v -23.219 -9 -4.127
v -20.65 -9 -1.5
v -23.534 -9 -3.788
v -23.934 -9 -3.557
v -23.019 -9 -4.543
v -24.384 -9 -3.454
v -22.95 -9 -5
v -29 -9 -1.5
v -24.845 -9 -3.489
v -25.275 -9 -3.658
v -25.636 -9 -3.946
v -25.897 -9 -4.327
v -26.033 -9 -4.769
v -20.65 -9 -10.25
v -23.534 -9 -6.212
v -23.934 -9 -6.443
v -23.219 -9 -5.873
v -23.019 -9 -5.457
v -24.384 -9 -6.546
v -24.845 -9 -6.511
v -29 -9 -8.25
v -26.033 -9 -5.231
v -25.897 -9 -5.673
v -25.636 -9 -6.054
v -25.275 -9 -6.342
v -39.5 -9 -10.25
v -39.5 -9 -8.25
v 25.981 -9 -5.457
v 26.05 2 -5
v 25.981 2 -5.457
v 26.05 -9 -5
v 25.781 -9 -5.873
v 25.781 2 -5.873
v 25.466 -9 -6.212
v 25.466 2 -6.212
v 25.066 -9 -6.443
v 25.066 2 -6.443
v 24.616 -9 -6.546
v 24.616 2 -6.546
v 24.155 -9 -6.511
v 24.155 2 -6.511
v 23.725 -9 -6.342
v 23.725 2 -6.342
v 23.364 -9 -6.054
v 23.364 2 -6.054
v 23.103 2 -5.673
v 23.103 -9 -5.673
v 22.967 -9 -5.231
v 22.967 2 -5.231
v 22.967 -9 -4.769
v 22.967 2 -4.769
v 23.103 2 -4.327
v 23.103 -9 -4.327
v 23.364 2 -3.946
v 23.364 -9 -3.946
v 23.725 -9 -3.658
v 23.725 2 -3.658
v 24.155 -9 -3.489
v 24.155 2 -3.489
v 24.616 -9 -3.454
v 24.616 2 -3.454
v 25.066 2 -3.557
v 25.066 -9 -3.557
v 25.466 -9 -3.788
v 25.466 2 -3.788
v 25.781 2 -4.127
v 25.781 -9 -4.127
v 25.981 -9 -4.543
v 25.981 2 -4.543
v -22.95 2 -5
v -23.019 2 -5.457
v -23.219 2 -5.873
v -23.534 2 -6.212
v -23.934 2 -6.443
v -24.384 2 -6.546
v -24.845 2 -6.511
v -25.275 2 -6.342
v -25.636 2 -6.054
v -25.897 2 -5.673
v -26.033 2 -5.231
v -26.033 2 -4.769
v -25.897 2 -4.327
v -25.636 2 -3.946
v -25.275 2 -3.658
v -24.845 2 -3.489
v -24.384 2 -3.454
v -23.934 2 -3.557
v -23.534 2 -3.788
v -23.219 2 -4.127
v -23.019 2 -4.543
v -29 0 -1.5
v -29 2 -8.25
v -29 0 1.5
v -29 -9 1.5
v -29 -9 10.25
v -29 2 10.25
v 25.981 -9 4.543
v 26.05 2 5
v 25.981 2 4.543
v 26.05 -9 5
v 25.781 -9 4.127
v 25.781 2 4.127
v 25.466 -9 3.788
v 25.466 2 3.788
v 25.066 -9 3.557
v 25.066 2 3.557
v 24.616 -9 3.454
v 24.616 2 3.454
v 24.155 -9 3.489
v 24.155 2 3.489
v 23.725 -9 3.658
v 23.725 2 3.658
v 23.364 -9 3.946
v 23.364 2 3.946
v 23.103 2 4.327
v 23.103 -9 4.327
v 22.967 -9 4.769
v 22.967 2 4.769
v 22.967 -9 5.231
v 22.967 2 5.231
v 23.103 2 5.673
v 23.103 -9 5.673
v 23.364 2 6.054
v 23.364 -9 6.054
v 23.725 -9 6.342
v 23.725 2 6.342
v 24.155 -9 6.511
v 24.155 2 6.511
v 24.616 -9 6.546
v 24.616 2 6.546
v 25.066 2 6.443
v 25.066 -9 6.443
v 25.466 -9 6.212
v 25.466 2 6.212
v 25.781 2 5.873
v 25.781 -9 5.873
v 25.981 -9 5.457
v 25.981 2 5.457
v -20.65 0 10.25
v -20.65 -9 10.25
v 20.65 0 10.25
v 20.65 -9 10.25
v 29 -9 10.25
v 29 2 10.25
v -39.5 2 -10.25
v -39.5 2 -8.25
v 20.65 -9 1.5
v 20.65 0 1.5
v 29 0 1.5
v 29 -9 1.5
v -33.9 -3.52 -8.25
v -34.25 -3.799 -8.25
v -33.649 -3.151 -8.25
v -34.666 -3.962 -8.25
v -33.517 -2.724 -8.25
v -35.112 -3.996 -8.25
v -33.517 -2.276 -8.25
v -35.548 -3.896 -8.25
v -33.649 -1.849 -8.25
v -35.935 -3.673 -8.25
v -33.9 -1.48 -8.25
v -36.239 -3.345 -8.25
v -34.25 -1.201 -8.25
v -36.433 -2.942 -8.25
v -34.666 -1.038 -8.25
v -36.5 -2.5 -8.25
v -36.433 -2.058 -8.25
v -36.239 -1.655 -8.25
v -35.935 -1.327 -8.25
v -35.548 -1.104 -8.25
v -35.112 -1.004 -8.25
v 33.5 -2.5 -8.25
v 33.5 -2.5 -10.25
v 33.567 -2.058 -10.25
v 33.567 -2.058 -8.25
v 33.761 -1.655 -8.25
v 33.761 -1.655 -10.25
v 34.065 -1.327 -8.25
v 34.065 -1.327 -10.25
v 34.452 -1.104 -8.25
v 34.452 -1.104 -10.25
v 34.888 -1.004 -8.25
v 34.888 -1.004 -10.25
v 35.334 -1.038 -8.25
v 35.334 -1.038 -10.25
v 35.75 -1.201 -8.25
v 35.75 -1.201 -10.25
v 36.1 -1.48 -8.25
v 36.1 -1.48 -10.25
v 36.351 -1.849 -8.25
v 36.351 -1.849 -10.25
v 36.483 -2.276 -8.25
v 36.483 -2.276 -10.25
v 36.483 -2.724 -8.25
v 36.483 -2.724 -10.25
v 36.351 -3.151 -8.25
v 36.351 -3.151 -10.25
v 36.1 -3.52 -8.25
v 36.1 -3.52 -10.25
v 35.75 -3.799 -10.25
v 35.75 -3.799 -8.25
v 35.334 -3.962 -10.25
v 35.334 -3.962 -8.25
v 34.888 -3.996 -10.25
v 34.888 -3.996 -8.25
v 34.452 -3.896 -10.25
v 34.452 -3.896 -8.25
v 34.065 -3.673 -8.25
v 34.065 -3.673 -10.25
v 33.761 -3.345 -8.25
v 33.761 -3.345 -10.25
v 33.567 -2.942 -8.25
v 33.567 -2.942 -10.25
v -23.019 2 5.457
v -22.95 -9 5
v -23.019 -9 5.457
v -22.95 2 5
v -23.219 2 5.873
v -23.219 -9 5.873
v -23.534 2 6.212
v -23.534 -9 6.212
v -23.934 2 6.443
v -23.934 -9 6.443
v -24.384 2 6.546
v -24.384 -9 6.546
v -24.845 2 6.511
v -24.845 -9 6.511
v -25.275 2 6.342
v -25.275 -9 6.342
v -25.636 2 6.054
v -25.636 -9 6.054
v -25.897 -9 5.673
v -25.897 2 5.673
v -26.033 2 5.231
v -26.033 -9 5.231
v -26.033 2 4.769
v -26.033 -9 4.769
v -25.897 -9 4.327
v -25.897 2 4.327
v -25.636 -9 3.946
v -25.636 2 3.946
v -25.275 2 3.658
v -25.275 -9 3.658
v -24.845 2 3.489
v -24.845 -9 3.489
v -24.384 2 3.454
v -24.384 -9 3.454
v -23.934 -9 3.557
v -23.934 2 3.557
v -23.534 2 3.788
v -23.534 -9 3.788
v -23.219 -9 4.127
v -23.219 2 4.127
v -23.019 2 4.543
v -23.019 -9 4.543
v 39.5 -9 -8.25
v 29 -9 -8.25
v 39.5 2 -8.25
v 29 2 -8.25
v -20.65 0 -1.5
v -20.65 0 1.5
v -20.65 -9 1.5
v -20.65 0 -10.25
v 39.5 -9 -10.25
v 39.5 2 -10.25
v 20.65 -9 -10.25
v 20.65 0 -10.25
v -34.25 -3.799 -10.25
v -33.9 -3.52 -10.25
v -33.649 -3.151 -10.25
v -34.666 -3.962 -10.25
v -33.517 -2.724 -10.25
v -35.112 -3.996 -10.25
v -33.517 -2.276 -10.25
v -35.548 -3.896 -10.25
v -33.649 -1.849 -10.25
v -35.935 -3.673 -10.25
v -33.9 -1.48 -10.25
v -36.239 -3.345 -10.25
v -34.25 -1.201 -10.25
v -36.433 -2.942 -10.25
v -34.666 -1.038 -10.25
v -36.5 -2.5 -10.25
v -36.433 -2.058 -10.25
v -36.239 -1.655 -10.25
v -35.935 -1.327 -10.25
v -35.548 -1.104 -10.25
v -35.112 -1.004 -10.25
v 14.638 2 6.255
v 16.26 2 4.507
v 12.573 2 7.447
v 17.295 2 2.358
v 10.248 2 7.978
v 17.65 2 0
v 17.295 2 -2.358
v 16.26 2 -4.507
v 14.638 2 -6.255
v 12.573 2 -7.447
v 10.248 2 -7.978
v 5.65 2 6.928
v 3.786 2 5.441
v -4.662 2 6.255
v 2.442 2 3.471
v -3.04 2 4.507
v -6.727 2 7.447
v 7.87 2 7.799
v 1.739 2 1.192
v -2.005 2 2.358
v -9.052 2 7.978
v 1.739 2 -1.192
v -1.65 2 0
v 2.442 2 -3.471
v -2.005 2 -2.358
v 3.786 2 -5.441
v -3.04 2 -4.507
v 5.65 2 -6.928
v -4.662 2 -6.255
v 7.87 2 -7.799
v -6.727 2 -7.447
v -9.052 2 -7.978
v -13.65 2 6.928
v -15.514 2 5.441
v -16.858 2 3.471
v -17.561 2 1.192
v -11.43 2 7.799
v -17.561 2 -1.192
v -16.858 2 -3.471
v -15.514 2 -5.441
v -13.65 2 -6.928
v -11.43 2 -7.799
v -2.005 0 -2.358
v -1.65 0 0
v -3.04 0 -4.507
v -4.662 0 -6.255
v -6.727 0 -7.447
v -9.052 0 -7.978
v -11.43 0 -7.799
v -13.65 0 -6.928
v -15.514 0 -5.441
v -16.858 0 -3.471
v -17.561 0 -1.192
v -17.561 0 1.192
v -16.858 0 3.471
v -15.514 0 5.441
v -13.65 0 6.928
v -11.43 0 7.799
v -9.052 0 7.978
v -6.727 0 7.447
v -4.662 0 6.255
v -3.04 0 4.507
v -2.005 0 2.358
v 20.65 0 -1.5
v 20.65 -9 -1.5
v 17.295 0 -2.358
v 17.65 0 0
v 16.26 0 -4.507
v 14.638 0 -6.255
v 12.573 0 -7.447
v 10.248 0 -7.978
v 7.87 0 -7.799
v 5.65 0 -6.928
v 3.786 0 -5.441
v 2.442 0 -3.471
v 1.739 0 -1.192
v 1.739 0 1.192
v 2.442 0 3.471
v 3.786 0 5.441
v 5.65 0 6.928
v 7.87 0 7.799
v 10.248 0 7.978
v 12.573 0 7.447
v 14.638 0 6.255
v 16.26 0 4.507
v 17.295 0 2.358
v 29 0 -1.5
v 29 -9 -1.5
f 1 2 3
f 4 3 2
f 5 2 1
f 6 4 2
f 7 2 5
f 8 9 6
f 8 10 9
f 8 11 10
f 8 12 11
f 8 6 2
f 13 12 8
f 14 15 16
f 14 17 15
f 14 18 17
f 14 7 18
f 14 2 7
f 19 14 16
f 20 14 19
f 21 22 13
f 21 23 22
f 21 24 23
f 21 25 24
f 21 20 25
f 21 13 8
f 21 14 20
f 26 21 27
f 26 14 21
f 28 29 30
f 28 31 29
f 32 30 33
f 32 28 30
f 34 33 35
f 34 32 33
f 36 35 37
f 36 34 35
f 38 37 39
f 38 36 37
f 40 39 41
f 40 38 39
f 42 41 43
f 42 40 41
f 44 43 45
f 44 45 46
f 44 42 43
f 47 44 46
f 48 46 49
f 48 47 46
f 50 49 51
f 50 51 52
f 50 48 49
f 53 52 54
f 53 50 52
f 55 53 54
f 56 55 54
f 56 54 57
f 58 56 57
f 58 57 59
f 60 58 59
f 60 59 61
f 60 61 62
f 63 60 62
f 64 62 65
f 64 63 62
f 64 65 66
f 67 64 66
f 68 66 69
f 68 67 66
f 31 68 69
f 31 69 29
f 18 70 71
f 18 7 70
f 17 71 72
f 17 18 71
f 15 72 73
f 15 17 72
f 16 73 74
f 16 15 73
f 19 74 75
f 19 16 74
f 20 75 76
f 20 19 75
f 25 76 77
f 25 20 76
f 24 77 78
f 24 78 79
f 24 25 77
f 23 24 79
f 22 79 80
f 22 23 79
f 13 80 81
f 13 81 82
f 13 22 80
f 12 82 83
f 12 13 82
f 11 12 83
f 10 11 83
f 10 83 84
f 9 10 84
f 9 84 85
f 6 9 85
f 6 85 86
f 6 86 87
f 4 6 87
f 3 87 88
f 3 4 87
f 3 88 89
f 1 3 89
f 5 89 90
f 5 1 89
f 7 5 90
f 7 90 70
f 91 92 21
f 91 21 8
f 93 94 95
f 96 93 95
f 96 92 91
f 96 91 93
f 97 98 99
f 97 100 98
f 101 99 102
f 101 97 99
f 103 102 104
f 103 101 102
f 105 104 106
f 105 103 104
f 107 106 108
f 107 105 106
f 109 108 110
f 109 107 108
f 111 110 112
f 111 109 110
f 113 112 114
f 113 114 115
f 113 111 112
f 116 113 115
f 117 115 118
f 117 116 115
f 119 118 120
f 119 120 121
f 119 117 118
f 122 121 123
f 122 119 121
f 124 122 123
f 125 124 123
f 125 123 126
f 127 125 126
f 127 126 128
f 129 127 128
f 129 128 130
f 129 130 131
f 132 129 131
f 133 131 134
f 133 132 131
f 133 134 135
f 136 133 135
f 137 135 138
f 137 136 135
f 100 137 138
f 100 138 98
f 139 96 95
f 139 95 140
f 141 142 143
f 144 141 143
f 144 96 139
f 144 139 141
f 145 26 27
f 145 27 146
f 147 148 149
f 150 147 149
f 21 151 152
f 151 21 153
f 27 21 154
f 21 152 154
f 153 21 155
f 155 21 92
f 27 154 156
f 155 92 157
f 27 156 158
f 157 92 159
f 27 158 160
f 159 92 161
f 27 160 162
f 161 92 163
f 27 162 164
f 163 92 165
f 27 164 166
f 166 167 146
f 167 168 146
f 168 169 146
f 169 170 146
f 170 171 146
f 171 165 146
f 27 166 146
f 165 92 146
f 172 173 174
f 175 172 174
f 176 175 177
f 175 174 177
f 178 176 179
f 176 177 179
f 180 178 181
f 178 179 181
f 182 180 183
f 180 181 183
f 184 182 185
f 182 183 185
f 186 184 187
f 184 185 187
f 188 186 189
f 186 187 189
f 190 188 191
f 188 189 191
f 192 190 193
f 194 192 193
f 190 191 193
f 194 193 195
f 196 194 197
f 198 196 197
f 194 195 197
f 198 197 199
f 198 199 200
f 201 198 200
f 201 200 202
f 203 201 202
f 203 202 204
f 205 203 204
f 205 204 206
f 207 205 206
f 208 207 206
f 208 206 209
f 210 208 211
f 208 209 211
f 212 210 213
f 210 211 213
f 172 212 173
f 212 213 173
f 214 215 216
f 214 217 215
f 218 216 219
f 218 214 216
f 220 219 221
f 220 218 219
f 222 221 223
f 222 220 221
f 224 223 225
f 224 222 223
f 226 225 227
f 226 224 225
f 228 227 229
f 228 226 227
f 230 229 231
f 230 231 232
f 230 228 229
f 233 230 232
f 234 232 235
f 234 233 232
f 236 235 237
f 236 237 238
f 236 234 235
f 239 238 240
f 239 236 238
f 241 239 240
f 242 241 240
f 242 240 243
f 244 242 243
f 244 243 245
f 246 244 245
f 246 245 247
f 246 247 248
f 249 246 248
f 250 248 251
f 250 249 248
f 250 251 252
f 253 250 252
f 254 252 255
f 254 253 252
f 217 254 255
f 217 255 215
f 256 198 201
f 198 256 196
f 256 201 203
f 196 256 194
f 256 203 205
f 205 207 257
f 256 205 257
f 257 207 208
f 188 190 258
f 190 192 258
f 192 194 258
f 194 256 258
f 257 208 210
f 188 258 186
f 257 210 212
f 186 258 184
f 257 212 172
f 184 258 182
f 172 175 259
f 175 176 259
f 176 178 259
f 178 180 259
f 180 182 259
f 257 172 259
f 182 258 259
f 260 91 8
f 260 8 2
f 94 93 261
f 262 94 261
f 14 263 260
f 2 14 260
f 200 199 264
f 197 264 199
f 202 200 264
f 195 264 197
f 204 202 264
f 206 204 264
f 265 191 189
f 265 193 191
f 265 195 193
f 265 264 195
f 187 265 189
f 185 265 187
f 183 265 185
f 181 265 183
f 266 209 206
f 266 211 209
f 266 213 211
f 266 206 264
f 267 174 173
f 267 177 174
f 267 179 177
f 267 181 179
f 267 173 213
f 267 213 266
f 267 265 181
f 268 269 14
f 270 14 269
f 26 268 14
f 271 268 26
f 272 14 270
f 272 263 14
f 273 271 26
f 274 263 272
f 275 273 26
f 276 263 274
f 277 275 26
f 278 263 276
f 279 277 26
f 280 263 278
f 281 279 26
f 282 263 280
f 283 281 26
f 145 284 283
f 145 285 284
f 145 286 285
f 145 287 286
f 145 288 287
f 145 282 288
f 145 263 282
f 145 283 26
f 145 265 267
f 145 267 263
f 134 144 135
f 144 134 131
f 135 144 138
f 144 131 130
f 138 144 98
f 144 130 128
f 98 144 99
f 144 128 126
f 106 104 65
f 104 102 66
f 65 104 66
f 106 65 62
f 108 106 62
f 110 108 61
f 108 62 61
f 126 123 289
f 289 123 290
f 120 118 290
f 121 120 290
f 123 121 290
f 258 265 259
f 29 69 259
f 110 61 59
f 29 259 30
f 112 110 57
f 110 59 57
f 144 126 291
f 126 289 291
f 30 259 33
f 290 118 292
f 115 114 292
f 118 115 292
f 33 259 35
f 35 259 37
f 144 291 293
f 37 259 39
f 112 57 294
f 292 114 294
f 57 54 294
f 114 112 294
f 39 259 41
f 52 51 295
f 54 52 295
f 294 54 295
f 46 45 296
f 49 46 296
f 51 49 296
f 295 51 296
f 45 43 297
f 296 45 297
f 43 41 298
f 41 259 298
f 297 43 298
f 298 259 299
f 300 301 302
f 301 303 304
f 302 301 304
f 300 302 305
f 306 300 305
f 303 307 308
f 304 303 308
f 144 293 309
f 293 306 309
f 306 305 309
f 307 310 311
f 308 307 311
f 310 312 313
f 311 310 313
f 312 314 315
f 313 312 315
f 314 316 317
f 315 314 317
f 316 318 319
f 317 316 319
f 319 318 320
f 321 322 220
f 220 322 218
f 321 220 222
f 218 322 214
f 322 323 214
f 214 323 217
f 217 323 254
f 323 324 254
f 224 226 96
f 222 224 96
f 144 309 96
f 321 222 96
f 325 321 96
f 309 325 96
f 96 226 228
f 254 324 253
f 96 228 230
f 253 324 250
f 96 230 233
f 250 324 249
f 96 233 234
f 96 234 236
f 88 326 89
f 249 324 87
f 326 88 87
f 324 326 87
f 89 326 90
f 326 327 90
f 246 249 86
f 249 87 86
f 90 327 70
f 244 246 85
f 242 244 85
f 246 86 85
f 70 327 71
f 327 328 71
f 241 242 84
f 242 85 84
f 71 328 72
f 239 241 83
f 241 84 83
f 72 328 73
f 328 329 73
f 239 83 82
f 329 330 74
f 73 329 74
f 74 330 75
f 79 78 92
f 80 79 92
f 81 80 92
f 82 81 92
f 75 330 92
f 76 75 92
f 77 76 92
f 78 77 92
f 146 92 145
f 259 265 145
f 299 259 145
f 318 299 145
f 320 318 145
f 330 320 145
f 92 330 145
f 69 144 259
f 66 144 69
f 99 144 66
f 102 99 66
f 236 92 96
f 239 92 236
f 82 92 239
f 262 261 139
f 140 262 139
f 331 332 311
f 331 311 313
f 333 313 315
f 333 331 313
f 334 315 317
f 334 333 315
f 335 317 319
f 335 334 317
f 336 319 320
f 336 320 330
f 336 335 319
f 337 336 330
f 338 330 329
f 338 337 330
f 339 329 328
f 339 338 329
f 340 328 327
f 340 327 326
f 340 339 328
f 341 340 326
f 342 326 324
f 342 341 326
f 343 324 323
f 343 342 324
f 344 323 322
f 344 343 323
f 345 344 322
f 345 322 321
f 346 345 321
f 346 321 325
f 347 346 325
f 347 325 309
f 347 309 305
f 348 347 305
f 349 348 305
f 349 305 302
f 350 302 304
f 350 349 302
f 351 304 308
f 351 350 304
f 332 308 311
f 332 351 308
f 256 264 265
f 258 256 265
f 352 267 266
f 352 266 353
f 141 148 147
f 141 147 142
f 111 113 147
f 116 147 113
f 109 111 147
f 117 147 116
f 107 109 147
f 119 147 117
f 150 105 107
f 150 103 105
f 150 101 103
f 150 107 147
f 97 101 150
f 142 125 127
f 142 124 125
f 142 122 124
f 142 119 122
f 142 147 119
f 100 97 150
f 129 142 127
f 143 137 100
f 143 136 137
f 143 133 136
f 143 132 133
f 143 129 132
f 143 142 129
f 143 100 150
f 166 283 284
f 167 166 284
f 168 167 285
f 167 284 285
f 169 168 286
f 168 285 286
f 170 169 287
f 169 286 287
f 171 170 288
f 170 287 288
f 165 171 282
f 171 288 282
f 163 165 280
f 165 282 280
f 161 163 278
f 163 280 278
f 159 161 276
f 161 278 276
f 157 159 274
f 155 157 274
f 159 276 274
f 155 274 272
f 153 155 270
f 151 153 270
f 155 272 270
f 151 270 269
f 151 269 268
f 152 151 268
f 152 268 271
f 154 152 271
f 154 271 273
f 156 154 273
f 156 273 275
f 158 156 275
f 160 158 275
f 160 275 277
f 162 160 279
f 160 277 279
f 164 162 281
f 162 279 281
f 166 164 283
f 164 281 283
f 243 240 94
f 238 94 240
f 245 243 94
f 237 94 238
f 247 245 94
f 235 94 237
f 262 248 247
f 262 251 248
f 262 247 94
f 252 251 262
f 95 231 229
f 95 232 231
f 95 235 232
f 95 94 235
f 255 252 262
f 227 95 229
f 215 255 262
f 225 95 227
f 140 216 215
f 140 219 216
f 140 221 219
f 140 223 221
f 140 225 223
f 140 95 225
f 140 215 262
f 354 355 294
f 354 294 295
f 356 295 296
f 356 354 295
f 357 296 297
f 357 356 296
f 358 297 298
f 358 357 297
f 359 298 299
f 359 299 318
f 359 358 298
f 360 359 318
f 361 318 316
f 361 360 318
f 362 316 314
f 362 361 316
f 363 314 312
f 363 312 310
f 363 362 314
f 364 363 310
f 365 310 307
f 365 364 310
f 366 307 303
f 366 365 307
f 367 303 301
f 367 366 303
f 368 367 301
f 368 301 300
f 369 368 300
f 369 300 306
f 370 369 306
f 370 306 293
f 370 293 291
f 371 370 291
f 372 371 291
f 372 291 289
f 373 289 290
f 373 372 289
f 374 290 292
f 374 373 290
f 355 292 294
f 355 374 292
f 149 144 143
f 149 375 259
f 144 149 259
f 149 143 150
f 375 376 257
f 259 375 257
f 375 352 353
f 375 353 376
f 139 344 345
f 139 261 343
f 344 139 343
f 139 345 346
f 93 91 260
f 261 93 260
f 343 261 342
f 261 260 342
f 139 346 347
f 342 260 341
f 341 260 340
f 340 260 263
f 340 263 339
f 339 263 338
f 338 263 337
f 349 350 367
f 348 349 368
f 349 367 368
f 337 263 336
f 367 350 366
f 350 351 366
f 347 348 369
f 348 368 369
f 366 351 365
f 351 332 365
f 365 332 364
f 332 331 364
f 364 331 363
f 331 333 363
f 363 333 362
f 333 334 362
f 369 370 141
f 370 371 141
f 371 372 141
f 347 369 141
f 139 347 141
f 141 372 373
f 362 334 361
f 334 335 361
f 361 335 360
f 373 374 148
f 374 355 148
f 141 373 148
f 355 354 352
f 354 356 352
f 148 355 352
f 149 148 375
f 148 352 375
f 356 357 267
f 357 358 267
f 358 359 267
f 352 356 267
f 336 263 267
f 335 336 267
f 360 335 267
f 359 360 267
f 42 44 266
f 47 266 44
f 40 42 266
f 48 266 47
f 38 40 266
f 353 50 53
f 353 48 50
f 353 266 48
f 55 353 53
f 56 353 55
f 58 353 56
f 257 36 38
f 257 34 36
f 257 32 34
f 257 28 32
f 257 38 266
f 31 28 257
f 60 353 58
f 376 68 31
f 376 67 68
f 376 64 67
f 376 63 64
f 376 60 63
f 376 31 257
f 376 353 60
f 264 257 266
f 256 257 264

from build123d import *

# Parameters (mm, degrees)
SKETCH2_W           = 58
SKETCH2_H           = 20.5
SKETCH2_R           = 8
SKETCH2_R_2         = 1.55
BOSS_EXTRUDE1_DEPTH = 2
SKETCH3_W           = 8.35
SKETCH3_H           = 8.75
SKETCH3_R           = 1.55
BOSS_EXTRUDE2_DEPTH = 9
SKETCH4_W           = 10.5
SKETCH4_H           = 11
SKETCH4_R           = 1.5
BOSS_EXTRUDE3_DEPTH = 2


with BuildPart() as part:
    # Sketch2 → Boss-Extrude1 (new body)
    with BuildSketch(Plane(origin=(0, 0, 0), x_dir=(1, 0, 0), z_dir=(0, 1, 0))):
        Rectangle(SKETCH2_W, SKETCH2_H)
        with Locations((-9.65, 0)):
            Circle(SKETCH2_R, mode=Mode.SUBTRACT)
        with Locations((-24.5, 5)):
            Circle(SKETCH2_R_2, mode=Mode.SUBTRACT)
        with Locations((-24.5, -5)):
            Circle(SKETCH2_R_2, mode=Mode.SUBTRACT)
        with Locations((24.5, 5)):
            Circle(SKETCH2_R_2, mode=Mode.SUBTRACT)
        with Locations((24.5, -5)):
            Circle(SKETCH2_R_2, mode=Mode.SUBTRACT)
        with Locations((9.65, 0)):
            Circle(SKETCH2_R, mode=Mode.SUBTRACT)
    extrude(amount=BOSS_EXTRUDE1_DEPTH)

    # Sketch3 → Boss-Extrude2 (add)
    with BuildSketch(Plane.XZ):
        with Locations((-24.825, 5.875)):
            Rectangle(SKETCH3_W, SKETCH3_H)
        with Locations((-24.5, 5)):
            Circle(SKETCH3_R, mode=Mode.SUBTRACT)
        with Locations((-24.825, -5.875)):
            Rectangle(SKETCH3_W, SKETCH3_H)
        with Locations((-24.5, -5)):
            Circle(SKETCH3_R, mode=Mode.SUBTRACT)
        with Locations((24.825, 5.875)):
            Rectangle(SKETCH3_W, SKETCH3_H)
        with Locations((24.5, 5)):
            Circle(SKETCH3_R, mode=Mode.SUBTRACT)
        with Locations((24.825, -5.875)):
            Rectangle(SKETCH3_W, SKETCH3_H)
        with Locations((24.5, -5)):
            Circle(SKETCH3_R, mode=Mode.SUBTRACT)
    extrude(amount=BOSS_EXTRUDE2_DEPTH)

    # Sketch4 → Boss-Extrude3 (add)
    with BuildSketch(Plane(origin=(0, 0, -10.25), x_dir=(-1, 0, 0), z_dir=(0, 0, -1))):
        with Locations((34.25, -3.5)):
            Rectangle(SKETCH4_W, SKETCH4_H)
        with Locations((35, -2.5)):
            Circle(SKETCH4_R, mode=Mode.SUBTRACT)
        with Locations((-34.25, -3.5)):
            Rectangle(SKETCH4_W, SKETCH4_H)
        with Locations((-35, -2.5)):
            Circle(SKETCH4_R, mode=Mode.SUBTRACT)
    extrude(amount=-BOSS_EXTRUDE3_DEPTH)


solid = part.part
